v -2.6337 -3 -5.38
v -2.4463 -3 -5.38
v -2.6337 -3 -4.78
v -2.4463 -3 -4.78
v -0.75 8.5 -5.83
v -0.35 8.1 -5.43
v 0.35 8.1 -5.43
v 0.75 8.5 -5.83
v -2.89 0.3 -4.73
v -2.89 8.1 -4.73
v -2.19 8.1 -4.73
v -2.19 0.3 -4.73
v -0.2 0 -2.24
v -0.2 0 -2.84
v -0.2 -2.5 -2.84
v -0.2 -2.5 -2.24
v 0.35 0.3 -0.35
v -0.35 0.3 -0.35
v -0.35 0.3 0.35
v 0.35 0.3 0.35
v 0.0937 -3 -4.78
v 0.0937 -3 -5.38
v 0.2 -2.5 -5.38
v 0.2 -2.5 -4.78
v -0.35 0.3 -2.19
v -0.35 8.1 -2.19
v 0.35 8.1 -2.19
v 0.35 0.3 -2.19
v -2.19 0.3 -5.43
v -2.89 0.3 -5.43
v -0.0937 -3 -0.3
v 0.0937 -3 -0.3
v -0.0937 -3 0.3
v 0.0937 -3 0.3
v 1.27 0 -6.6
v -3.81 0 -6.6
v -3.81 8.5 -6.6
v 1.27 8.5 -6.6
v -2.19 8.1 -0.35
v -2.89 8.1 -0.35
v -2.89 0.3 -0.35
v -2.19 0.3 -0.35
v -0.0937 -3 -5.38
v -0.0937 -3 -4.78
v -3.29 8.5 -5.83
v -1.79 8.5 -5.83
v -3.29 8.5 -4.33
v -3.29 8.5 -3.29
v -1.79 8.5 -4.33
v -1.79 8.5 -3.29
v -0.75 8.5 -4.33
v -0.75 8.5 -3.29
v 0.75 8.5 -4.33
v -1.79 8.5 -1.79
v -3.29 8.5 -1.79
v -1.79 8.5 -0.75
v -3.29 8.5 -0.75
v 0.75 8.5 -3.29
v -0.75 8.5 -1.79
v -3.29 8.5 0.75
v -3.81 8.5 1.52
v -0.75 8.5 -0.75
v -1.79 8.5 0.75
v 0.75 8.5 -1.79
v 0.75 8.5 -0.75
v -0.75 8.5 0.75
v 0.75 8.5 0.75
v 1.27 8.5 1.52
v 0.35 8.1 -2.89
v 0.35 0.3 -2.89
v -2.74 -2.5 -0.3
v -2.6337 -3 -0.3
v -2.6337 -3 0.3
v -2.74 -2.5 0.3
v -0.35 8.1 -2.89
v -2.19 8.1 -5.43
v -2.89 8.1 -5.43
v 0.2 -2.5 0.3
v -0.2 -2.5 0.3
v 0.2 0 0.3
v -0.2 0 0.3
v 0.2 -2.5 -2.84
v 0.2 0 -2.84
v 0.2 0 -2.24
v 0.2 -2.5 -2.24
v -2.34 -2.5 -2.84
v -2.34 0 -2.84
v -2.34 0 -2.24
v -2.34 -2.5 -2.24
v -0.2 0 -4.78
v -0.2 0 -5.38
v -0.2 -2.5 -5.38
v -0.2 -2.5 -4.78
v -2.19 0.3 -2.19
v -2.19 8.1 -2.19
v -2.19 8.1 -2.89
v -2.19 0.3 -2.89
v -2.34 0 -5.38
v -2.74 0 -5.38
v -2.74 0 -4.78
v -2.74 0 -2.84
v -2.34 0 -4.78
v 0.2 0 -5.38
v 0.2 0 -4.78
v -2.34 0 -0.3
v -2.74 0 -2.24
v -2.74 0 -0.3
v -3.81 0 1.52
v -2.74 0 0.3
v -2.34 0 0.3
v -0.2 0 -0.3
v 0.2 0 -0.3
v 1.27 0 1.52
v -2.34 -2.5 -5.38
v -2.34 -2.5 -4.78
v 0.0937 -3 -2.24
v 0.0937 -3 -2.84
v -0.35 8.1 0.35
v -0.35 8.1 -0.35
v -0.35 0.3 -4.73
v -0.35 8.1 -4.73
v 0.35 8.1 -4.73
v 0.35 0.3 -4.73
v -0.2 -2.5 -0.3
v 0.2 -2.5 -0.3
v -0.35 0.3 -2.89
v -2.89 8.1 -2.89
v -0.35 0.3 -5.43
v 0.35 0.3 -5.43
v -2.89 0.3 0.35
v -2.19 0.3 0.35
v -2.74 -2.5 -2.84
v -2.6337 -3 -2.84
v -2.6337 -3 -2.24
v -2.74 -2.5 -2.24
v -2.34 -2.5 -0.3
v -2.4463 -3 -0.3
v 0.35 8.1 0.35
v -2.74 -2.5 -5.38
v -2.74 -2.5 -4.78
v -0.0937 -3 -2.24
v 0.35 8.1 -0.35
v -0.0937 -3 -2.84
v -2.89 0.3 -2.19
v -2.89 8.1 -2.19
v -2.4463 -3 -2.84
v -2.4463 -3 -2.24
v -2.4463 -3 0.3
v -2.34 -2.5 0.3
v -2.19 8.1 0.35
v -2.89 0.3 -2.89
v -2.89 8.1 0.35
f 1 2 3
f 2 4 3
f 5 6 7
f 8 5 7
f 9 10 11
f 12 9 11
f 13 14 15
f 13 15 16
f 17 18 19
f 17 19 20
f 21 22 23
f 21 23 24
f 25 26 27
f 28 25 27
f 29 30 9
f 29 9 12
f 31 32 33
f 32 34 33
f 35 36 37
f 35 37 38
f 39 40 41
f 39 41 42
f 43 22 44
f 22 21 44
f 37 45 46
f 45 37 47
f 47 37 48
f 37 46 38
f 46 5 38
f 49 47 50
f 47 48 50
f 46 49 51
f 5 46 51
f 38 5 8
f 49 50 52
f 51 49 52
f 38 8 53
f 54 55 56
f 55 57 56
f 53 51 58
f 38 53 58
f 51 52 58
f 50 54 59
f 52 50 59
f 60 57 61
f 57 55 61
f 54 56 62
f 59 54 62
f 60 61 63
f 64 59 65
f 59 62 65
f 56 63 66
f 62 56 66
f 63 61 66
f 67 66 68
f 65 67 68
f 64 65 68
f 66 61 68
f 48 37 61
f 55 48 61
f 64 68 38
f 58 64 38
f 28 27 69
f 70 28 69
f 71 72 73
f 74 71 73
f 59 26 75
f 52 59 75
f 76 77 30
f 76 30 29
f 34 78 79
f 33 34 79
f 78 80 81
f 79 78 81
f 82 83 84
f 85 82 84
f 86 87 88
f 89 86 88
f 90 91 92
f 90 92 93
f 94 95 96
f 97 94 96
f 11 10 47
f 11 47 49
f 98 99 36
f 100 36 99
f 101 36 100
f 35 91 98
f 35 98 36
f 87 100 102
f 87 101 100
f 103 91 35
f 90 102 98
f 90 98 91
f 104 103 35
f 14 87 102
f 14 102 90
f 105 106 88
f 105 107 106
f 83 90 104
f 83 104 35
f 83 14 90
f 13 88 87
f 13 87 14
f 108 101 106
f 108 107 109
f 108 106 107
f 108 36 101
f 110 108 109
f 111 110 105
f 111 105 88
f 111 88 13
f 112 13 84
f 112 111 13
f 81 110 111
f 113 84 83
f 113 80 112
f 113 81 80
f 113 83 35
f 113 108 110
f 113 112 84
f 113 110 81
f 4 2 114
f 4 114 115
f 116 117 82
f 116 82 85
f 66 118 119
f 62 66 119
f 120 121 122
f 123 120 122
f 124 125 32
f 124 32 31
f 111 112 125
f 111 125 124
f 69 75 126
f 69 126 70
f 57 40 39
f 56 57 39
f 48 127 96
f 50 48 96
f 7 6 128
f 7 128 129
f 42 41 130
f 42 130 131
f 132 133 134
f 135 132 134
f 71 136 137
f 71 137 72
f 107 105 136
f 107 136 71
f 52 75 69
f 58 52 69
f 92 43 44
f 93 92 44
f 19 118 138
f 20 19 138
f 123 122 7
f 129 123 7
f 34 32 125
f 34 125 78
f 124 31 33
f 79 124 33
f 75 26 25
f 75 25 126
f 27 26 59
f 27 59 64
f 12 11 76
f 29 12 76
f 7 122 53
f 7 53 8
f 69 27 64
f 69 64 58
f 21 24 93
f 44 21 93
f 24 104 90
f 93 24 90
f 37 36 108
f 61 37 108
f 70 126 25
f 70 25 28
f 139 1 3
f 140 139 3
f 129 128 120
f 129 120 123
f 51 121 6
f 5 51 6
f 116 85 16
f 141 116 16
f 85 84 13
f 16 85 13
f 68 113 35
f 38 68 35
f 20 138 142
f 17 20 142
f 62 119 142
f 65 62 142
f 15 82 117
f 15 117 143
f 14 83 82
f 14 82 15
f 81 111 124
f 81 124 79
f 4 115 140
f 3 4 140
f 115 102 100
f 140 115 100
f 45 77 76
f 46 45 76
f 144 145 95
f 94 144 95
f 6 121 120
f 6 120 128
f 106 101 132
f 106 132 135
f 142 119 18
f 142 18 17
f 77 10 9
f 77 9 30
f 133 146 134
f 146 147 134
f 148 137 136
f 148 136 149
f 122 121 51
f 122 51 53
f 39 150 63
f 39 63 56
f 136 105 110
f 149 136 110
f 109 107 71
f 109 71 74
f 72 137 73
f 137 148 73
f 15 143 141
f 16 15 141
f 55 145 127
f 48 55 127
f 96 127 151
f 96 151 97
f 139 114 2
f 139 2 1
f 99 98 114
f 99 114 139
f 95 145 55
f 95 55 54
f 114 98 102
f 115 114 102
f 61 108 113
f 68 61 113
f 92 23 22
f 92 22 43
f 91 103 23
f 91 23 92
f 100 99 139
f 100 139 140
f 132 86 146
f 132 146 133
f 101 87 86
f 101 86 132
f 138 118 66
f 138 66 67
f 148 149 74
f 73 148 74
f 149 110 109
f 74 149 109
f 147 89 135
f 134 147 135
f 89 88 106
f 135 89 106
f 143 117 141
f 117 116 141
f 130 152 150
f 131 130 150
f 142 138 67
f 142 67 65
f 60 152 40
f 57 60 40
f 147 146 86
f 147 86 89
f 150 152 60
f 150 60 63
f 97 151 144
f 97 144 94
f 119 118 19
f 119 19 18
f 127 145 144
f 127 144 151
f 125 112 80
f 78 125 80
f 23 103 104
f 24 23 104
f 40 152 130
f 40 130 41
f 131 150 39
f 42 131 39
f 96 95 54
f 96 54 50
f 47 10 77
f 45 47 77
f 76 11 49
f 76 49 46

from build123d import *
from OCP.BRepFilletAPI import BRepFilletAPI_MakeChamfer

# Parameters (mm, degrees)
EXTRUDE_1_DEPTH                     = 8.5
SKETCH_4_W                          = 0.7
SKETCH_4_H                          = 0.7
CUT_EXTRUDE_1_DEPTH                 = 8.2
CHAMFER_3_SIZE                      = 0.4
SKETCH_2_W                          = 0.4
SKETCH_2_H                          = 0.6
EXTRUDE_2_DEPTH                     = 3
CHAMFER_2_SIZE                      = 0.5
CHAMFER_2_SIZE2                     = 0.106278281
PATTERN_LINEAR_1_COUNT              = 3
PATTERN_LINEAR_1_PITCH              = 2.54
PATTERN_LINEAR_1_COUNT_DIR2         = 2
PATTERN_LINEAR_1_PITCH_DIR2         = 2.54
CHAMFER_3_OF_PATTERN_LINEAR_1_SIZE  = 0.4
CHAMFER_2_OF_PATTERN_LINEAR_1_SIZE  = 0.5
CHAMFER_2_OF_PATTERN_LINEAR_1_SIZE2 = 0.106278281


with BuildPart() as part:
    # Эскиз1 → Бобышка-Вытянуть1 (new body)
    with BuildSketch(Plane(origin=(0, 0, 0), x_dir=(-1, 0, 0), z_dir=(0, 1, 0))):
        Polygon((-1.27, 1.52), (1.27, 1.52), (3.81, 1.52), (3.81, -1.52), (3.81, -6.6), (-1.27, -6.6), (-1.27, -1.52), align=None)
    extrude(amount=EXTRUDE_1_DEPTH)

    # Эскиз4 → Вырез-Вытянуть1 (cut)
    with BuildSketch(Plane(origin=(0, 8.5, 0), x_dir=(1, 0, 0), z_dir=(0, 1, 0))):
        Rectangle(SKETCH_4_W, SKETCH_4_H)
    cut_extrude_1 = extrude(amount=-CUT_EXTRUDE_1_DEPTH, mode=Mode.SUBTRACT)

    # Фаска3
    chamfer_3_edges = [part.edges().sort_by_distance(p)[0] for p in [
        (-0.35, 8.5, 0),
        (0, 8.5, 0.35),
        (0.35, 8.5, 0),
        (0, 8.5, -0.35),
    ]]
    chamfer(chamfer_3_edges, length=CHAMFER_3_SIZE)

    # Эскиз2 → Бобышка-Вытянуть2 (add)
    with BuildSketch(Plane(origin=(0, 0, 0), x_dir=(-1, 0, 0), z_dir=(0, 1, 0))):
        Rectangle(SKETCH_2_W, SKETCH_2_H)
    extrude_2 = extrude(amount=-EXTRUDE_2_DEPTH)

    # Фаска2: one chamfer whose edges measure the first distance from different faces: ONE call of the kernel's chamfer builder (chamfer() names one face for all edges)
    chamfer_2_edges_1 = [part.edges().sort_by_distance(p)[0] for p in [
        (-0.2, -3, 0),
    ]]
    chamfer_2_side_1 = [part.faces().sort_by_distance(p)[0] for p in [
        (-0.2, -1.5, 0),
    ]]
    chamfer_2_edges_2 = [part.edges().sort_by_distance(p)[0] for p in [
        (0.2, -3, 0),
    ]]
    chamfer_2_side_2 = [part.faces().sort_by_distance(p)[0] for p in [
        (0.2, -1.5, 0),
    ]]
    chamfer_2 = BRepFilletAPI_MakeChamfer(part.part.solid().wrapped)
    for e in chamfer_2_edges_1:
        chamfer_2.Add(CHAMFER_2_SIZE, CHAMFER_2_SIZE2, e.wrapped, chamfer_2_side_1[0].wrapped)  # the first distance lies on this face
    for e in chamfer_2_edges_2:
        chamfer_2.Add(CHAMFER_2_SIZE, CHAMFER_2_SIZE2, e.wrapped, chamfer_2_side_2[0].wrapped)  # the first distance lies on this face
    add(Compound.cast(chamfer_2.Shape()), mode=Mode.REPLACE)

    # Линейный массив1: Вырез-Вытянуть1, Extrude 2 3 × 2
    with Locations(*[(-j * PATTERN_LINEAR_1_PITCH_DIR2, 0, -i * PATTERN_LINEAR_1_PITCH) for i in range(PATTERN_LINEAR_1_COUNT) for j in range(PATTERN_LINEAR_1_COUNT_DIR2) if (i, j) != (0, 0)]):
        add(cut_extrude_1, mode=Mode.SUBTRACT)
        add(extrude_2)

    # Фаска3 of Линейный массив1
    chamfer_3_of_pattern_linear_1_edges = [part.edges().sort_by_distance(p)[0] for p in [
        (-2.89, 8.5, 0),
        (-2.54, 8.5, 0.35),
        (-2.19, 8.5, 0),
        (-2.54, 8.5, -0.35),
        (-0.35, 8.5, -2.54),
        (0, 8.5, -2.19),
        (0.35, 8.5, -2.54),
        (0, 8.5, -2.89),
        (-2.89, 8.5, -2.54),
        (-2.54, 8.5, -2.19),
        (-2.19, 8.5, -2.54),
        (-2.54, 8.5, -2.89),
        (-0.35, 8.5, -5.08),
        (0, 8.5, -4.73),
        (0.35, 8.5, -5.08),
        (0, 8.5, -5.43),
        (-2.89, 8.5, -5.08),
        (-2.54, 8.5, -4.73),
        (-2.19, 8.5, -5.08),
        (-2.54, 8.5, -5.43),
    ]]
    chamfer(chamfer_3_of_pattern_linear_1_edges, length=CHAMFER_3_OF_PATTERN_LINEAR_1_SIZE)

    # Фаска2 of Линейный массив1: one chamfer whose edges measure the first distance from different faces: ONE call of the kernel's chamfer builder (chamfer() names one face for all edges)
    chamfer_2_of_pattern_linear_1_edges_1 = [part.edges().sort_by_distance(p)[0] for p in [
        (-2.74, -3, 0),
    ]]
    chamfer_2_of_pattern_linear_1_side_1 = [part.faces().sort_by_distance(p)[0] for p in [
        (-2.74, -1.5, 0),
    ]]
    chamfer_2_of_pattern_linear_1_edges_2 = [part.edges().sort_by_distance(p)[0] for p in [
        (-2.34, -3, 0),
    ]]
    chamfer_2_of_pattern_linear_1_side_2 = [part.faces().sort_by_distance(p)[0] for p in [
        (-2.34, -1.5, 0),
    ]]
    chamfer_2_of_pattern_linear_1_edges_3 = [part.edges().sort_by_distance(p)[0] for p in [
        (-0.2, -3, -2.54),
    ]]
    chamfer_2_of_pattern_linear_1_side_3 = [part.faces().sort_by_distance(p)[0] for p in [
        (-0.2, -1.5, -2.54),
    ]]
    chamfer_2_of_pattern_linear_1_edges_4 = [part.edges().sort_by_distance(p)[0] for p in [
        (0.2, -3, -2.54),
    ]]
    chamfer_2_of_pattern_linear_1_side_4 = [part.faces().sort_by_distance(p)[0] for p in [
        (0.2, -1.5, -2.54),
    ]]
    chamfer_2_of_pattern_linear_1_edges_5 = [part.edges().sort_by_distance(p)[0] for p in [
        (-2.74, -3, -2.54),
    ]]
    chamfer_2_of_pattern_linear_1_side_5 = [part.faces().sort_by_distance(p)[0] for p in [
        (-2.74, -1.5, -2.54),
    ]]
    chamfer_2_of_pattern_linear_1_edges_6 = [part.edges().sort_by_distance(p)[0] for p in [
        (-2.34, -3, -2.54),
    ]]
    chamfer_2_of_pattern_linear_1_side_6 = [part.faces().sort_by_distance(p)[0] for p in [
        (-2.34, -1.5, -2.54),
    ]]
    chamfer_2_of_pattern_linear_1_edges_7 = [part.edges().sort_by_distance(p)[0] for p in [
        (-0.2, -3, -5.08),
    ]]
    chamfer_2_of_pattern_linear_1_side_7 = [part.faces().sort_by_distance(p)[0] for p in [
        (-0.2, -1.5, -5.08),
    ]]
    chamfer_2_of_pattern_linear_1_edges_8 = [part.edges().sort_by_distance(p)[0] for p in [
        (0.2, -3, -5.08),
    ]]
    chamfer_2_of_pattern_linear_1_side_8 = [part.faces().sort_by_distance(p)[0] for p in [
        (0.2, -1.5, -5.08),
    ]]
    chamfer_2_of_pattern_linear_1_edges_9 = [part.edges().sort_by_distance(p)[0] for p in [
        (-2.74, -3, -5.08),
    ]]
    chamfer_2_of_pattern_linear_1_side_9 = [part.faces().sort_by_distance(p)[0] for p in [
        (-2.74, -1.5, -5.08),
    ]]
    chamfer_2_of_pattern_linear_1_edges_10 = [part.edges().sort_by_distance(p)[0] for p in [
        (-2.34, -3, -5.08),
    ]]
    chamfer_2_of_pattern_linear_1_side_10 = [part.faces().sort_by_distance(p)[0] for p in [
        (-2.34, -1.5, -5.08),
    ]]
    chamfer_2_of_pattern_linear_1 = BRepFilletAPI_MakeChamfer(part.part.solid().wrapped)
    for e in chamfer_2_of_pattern_linear_1_edges_1:
        chamfer_2_of_pattern_linear_1.Add(CHAMFER_2_OF_PATTERN_LINEAR_1_SIZE, CHAMFER_2_OF_PATTERN_LINEAR_1_SIZE2, e.wrapped, chamfer_2_of_pattern_linear_1_side_1[0].wrapped)  # the first distance lies on this face
    for e in chamfer_2_of_pattern_linear_1_edges_2:
        chamfer_2_of_pattern_linear_1.Add(CHAMFER_2_OF_PATTERN_LINEAR_1_SIZE, CHAMFER_2_OF_PATTERN_LINEAR_1_SIZE2, e.wrapped, chamfer_2_of_pattern_linear_1_side_2[0].wrapped)  # the first distance lies on this face
    for e in chamfer_2_of_pattern_linear_1_edges_3:
        chamfer_2_of_pattern_linear_1.Add(CHAMFER_2_OF_PATTERN_LINEAR_1_SIZE, CHAMFER_2_OF_PATTERN_LINEAR_1_SIZE2, e.wrapped, chamfer_2_of_pattern_linear_1_side_3[0].wrapped)  # the first distance lies on this face
    for e in chamfer_2_of_pattern_linear_1_edges_4:
        chamfer_2_of_pattern_linear_1.Add(CHAMFER_2_OF_PATTERN_LINEAR_1_SIZE, CHAMFER_2_OF_PATTERN_LINEAR_1_SIZE2, e.wrapped, chamfer_2_of_pattern_linear_1_side_4[0].wrapped)  # the first distance lies on this face
    for e in chamfer_2_of_pattern_linear_1_edges_5:
        chamfer_2_of_pattern_linear_1.Add(CHAMFER_2_OF_PATTERN_LINEAR_1_SIZE, CHAMFER_2_OF_PATTERN_LINEAR_1_SIZE2, e.wrapped, chamfer_2_of_pattern_linear_1_side_5[0].wrapped)  # the first distance lies on this face
    for e in chamfer_2_of_pattern_linear_1_edges_6:
        chamfer_2_of_pattern_linear_1.Add(CHAMFER_2_OF_PATTERN_LINEAR_1_SIZE, CHAMFER_2_OF_PATTERN_LINEAR_1_SIZE2, e.wrapped, chamfer_2_of_pattern_linear_1_side_6[0].wrapped)  # the first distance lies on this face
    for e in chamfer_2_of_pattern_linear_1_edges_7:
        chamfer_2_of_pattern_linear_1.Add(CHAMFER_2_OF_PATTERN_LINEAR_1_SIZE, CHAMFER_2_OF_PATTERN_LINEAR_1_SIZE2, e.wrapped, chamfer_2_of_pattern_linear_1_side_7[0].wrapped)  # the first distance lies on this face
    for e in chamfer_2_of_pattern_linear_1_edges_8:
        chamfer_2_of_pattern_linear_1.Add(CHAMFER_2_OF_PATTERN_LINEAR_1_SIZE, CHAMFER_2_OF_PATTERN_LINEAR_1_SIZE2, e.wrapped, chamfer_2_of_pattern_linear_1_side_8[0].wrapped)  # the first distance lies on this face
    for e in chamfer_2_of_pattern_linear_1_edges_9:
        chamfer_2_of_pattern_linear_1.Add(CHAMFER_2_OF_PATTERN_LINEAR_1_SIZE, CHAMFER_2_OF_PATTERN_LINEAR_1_SIZE2, e.wrapped, chamfer_2_of_pattern_linear_1_side_9[0].wrapped)  # the first distance lies on this face
    for e in chamfer_2_of_pattern_linear_1_edges_10:
        chamfer_2_of_pattern_linear_1.Add(CHAMFER_2_OF_PATTERN_LINEAR_1_SIZE, CHAMFER_2_OF_PATTERN_LINEAR_1_SIZE2, e.wrapped, chamfer_2_of_pattern_linear_1_side_10[0].wrapped)  # the first distance lies on this face
    add(Compound.cast(chamfer_2_of_pattern_linear_1.Shape()), mode=Mode.REPLACE)


solid = part.part
